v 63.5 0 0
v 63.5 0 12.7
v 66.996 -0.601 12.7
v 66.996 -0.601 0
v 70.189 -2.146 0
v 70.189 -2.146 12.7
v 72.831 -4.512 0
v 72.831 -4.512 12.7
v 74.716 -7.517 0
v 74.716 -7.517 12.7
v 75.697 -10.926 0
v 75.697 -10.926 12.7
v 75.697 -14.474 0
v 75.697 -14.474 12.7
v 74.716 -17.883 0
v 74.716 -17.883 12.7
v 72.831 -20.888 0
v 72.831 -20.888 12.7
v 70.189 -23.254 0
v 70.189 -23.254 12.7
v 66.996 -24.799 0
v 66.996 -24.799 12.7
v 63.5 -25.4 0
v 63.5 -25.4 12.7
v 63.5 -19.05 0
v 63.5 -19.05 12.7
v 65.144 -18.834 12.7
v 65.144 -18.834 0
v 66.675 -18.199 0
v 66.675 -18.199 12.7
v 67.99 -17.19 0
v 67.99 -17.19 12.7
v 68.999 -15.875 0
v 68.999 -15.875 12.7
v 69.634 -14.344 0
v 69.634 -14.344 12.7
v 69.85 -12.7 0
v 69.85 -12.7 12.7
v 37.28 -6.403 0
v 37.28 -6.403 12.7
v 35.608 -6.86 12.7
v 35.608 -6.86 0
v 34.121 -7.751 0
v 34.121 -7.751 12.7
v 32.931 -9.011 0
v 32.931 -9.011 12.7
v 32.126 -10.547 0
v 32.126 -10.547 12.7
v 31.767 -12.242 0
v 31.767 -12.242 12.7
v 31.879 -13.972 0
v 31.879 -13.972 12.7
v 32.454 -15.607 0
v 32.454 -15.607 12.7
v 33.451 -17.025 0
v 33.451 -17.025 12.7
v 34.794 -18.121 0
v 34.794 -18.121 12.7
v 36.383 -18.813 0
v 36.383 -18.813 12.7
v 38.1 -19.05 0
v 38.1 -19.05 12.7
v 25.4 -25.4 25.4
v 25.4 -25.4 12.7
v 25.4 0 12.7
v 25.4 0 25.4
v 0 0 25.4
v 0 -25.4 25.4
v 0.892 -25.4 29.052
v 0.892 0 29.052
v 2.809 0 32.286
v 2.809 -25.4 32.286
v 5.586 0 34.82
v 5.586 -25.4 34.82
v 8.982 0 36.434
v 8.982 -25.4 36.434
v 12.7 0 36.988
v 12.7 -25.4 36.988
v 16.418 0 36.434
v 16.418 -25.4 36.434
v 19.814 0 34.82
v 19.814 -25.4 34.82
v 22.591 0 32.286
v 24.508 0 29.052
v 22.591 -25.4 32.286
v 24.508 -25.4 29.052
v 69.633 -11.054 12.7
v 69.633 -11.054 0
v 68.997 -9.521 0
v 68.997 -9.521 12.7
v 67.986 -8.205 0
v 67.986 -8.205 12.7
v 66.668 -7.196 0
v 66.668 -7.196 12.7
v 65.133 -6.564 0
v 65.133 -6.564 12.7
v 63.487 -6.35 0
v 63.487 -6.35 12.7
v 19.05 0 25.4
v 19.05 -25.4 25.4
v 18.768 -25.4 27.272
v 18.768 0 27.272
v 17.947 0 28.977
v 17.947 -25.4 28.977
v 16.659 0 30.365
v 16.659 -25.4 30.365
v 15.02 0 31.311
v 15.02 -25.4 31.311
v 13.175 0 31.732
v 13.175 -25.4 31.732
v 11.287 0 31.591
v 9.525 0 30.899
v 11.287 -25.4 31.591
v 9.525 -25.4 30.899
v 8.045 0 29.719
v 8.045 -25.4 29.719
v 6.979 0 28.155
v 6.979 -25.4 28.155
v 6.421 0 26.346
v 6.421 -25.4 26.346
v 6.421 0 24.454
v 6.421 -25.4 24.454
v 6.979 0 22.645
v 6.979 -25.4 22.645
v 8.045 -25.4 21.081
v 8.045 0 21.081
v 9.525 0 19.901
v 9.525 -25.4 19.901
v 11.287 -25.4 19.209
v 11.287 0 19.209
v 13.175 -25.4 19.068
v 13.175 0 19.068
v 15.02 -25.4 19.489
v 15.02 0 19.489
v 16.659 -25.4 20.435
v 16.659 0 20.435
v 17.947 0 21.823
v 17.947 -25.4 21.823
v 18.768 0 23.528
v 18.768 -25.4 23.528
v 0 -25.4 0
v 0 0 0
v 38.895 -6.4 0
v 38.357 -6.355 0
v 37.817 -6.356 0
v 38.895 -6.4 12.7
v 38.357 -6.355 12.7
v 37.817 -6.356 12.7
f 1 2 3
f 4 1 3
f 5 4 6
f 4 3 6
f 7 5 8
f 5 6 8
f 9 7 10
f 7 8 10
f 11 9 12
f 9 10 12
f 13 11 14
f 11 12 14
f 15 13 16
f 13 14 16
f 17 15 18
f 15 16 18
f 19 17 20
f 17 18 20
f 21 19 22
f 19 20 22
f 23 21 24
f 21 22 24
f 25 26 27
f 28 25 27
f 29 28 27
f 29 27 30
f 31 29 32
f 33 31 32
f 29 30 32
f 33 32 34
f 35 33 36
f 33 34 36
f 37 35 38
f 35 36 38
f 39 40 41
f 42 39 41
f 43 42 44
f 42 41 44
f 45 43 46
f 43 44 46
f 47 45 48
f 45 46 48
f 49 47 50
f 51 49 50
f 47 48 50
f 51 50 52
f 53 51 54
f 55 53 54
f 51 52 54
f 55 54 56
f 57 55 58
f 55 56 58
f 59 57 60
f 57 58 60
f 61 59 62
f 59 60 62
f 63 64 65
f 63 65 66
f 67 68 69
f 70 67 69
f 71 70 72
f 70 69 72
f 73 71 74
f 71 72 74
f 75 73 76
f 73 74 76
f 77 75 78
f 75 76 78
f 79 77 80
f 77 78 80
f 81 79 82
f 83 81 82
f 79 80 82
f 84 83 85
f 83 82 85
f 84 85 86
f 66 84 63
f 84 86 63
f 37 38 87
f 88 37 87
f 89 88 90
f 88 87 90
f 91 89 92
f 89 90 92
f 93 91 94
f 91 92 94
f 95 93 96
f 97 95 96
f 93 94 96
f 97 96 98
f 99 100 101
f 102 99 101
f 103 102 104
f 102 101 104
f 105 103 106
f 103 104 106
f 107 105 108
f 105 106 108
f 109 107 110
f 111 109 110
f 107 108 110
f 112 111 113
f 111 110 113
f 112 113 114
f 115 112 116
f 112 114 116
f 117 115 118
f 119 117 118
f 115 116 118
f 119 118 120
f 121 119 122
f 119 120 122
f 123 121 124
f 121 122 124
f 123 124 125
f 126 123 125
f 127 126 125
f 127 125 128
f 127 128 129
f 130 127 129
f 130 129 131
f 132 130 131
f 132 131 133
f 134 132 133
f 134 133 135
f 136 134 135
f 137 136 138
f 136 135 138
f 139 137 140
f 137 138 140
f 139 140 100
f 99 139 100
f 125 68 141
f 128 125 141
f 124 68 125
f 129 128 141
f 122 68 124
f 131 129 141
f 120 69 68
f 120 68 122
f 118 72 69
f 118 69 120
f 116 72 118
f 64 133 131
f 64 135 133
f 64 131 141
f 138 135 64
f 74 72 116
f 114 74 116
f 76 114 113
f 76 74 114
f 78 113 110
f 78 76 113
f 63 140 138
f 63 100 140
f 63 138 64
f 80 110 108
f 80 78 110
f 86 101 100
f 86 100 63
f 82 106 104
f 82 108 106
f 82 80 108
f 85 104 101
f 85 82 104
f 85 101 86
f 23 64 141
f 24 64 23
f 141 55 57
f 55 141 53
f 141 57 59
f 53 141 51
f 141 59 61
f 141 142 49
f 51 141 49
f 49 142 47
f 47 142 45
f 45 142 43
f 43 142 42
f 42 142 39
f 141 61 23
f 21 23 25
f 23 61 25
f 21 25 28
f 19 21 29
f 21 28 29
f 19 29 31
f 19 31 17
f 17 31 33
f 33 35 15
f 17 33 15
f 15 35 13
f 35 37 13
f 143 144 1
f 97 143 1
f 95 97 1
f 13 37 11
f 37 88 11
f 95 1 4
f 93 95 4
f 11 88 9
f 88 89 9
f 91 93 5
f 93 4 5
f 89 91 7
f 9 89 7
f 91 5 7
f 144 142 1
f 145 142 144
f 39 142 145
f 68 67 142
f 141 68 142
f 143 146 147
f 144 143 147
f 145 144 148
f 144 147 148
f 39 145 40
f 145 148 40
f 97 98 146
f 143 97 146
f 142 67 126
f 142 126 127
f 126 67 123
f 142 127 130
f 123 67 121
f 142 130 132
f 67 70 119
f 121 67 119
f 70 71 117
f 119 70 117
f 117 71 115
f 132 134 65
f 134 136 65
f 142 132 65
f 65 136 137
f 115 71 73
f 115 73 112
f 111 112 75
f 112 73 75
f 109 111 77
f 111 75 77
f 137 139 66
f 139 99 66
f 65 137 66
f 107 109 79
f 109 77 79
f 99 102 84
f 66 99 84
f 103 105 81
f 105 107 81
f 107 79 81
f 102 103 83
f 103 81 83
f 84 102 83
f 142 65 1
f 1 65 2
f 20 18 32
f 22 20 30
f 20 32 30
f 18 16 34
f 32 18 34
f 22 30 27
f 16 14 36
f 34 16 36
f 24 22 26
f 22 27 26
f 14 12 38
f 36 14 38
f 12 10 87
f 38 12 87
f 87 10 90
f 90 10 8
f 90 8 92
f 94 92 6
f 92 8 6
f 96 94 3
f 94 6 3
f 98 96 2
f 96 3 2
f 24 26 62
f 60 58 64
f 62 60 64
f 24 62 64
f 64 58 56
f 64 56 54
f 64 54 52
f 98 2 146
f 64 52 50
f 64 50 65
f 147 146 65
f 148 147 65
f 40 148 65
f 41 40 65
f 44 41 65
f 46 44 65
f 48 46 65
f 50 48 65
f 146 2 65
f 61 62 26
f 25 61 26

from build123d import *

# Parameters (mm, degrees)
F1_DEPTH = 25.4
F2_R     = 6.35
F3_DEPTH = 25.4
F5_DEPTH = 25.4
F7_DEPTH = 25.4


with BuildPart() as f1:
    # F0 (on Front) → F1 (new body)
    with BuildSketch(Plane.XZ):
        Polygon((25.4, 38.1), (0, 38.1), (0, 0), (76.2, 0), (76.2, 12.7), (25.4, 12.7), align=None)
    extrude(amount=F1_DEPTH)

    # F2 (on face) → F3 (cut)
    with BuildSketch(Plane.XZ.offset(25.4)):
        with Locations((12.7, 25.4)):
            Circle(F2_R)
        with BuildLine():
            ThreePointArc((0, 25.4), (12.7, 36.9881682831), (25.4, 25.4))
            Line((25.4, 25.4), (25.4, 38.1))
            Line((25.4, 38.1), (0, 38.1))
            Line((0, 38.1), (0, 25.4))
        make_face()
    extrude(amount=-F3_DEPTH, mode=Mode.SUBTRACT)

    # F4 (on face) → F5 (cut)
    with BuildSketch(Plane.XY.offset(12.7)):
        with BuildLine():
            ThreePointArc((38.8945956535, -6.3999112905), (38.0871158775, -6.3500130709), (37.2798452362, -6.4031876188))
            Line((37.2798452362, -6.4031876188), (38.8945956535, -6.3999112905))
        make_face()
        with BuildLine():
            ThreePointArc((63.4871158775, -6.3500130709), (57.1500032677, -12.7064420645), (63.5, -19.05))
            Line((63.5, -19.05), (63.4871158775, -6.3500130709))
        make_face()
        with BuildLine():
            Line((63.4871158775, -6.3500130709), (63.5, -19.05))
            ThreePointArc((63.5, -19.05), (67.9901280605, -17.1901280605), (69.85, -12.7))
            ThreePointArc((69.85, -12.7), (67.9855705224, -8.2053190226), (63.4871158775, -6.3500130709))
        make_face()
        with BuildLine():
            ThreePointArc((44.45, -12.7), (42.5901280605, -17.1901280605), (38.1, -19.05))
            Line((38.1, -19.05), (63.5, -19.05))
            ThreePointArc((63.5, -19.05), (57.1500032677, -12.7064420645), (63.4871158775, -6.3500130709))
            Line((63.4871158775, -6.3500130709), (38.8945956535, -6.3999112905))
            ThreePointArc((38.8945956535, -6.3999112905), (42.8627818762, -8.5001894328), (44.45, -12.7))
        make_face()
        with BuildLine():
            Line((38.8945956535, -6.3999112905), (37.2798452362, -6.4031876188))
            Line((37.2798452362, -6.4031876188), (38.1, -19.05))
            ThreePointArc((38.1, -19.05), (42.5901280605, -17.1901280605), (44.45, -12.7))
            ThreePointArc((44.45, -12.7), (42.8627818762, -8.5001894328), (38.8945956535, -6.3999112905))
        make_face()
        with BuildLine():
            Line((38.1, -19.05), (37.2798452362, -6.4031876188))
            ThreePointArc((37.2798452362, -6.4031876188), (31.7633108558, -13.1109387909), (38.1, -19.05))
        make_face()
    extrude(amount=-F5_DEPTH, mode=Mode.SUBTRACT)

    # F6 (on face) → F7 (cut)
    with BuildSketch(Plane.XY.offset(12.7)):
        with BuildLine():
            ThreePointArc((63.5, 0), (75.8211182334, -12.7), (63.5, -25.4))
            Line((63.5, -25.4), (76.2, -25.4))
            Line((76.2, -25.4), (76.2, 0))
            Line((76.2, 0), (63.5, 0))
        make_face()
    extrude(amount=-F7_DEPTH, mode=Mode.SUBTRACT)


solid = f1.part
